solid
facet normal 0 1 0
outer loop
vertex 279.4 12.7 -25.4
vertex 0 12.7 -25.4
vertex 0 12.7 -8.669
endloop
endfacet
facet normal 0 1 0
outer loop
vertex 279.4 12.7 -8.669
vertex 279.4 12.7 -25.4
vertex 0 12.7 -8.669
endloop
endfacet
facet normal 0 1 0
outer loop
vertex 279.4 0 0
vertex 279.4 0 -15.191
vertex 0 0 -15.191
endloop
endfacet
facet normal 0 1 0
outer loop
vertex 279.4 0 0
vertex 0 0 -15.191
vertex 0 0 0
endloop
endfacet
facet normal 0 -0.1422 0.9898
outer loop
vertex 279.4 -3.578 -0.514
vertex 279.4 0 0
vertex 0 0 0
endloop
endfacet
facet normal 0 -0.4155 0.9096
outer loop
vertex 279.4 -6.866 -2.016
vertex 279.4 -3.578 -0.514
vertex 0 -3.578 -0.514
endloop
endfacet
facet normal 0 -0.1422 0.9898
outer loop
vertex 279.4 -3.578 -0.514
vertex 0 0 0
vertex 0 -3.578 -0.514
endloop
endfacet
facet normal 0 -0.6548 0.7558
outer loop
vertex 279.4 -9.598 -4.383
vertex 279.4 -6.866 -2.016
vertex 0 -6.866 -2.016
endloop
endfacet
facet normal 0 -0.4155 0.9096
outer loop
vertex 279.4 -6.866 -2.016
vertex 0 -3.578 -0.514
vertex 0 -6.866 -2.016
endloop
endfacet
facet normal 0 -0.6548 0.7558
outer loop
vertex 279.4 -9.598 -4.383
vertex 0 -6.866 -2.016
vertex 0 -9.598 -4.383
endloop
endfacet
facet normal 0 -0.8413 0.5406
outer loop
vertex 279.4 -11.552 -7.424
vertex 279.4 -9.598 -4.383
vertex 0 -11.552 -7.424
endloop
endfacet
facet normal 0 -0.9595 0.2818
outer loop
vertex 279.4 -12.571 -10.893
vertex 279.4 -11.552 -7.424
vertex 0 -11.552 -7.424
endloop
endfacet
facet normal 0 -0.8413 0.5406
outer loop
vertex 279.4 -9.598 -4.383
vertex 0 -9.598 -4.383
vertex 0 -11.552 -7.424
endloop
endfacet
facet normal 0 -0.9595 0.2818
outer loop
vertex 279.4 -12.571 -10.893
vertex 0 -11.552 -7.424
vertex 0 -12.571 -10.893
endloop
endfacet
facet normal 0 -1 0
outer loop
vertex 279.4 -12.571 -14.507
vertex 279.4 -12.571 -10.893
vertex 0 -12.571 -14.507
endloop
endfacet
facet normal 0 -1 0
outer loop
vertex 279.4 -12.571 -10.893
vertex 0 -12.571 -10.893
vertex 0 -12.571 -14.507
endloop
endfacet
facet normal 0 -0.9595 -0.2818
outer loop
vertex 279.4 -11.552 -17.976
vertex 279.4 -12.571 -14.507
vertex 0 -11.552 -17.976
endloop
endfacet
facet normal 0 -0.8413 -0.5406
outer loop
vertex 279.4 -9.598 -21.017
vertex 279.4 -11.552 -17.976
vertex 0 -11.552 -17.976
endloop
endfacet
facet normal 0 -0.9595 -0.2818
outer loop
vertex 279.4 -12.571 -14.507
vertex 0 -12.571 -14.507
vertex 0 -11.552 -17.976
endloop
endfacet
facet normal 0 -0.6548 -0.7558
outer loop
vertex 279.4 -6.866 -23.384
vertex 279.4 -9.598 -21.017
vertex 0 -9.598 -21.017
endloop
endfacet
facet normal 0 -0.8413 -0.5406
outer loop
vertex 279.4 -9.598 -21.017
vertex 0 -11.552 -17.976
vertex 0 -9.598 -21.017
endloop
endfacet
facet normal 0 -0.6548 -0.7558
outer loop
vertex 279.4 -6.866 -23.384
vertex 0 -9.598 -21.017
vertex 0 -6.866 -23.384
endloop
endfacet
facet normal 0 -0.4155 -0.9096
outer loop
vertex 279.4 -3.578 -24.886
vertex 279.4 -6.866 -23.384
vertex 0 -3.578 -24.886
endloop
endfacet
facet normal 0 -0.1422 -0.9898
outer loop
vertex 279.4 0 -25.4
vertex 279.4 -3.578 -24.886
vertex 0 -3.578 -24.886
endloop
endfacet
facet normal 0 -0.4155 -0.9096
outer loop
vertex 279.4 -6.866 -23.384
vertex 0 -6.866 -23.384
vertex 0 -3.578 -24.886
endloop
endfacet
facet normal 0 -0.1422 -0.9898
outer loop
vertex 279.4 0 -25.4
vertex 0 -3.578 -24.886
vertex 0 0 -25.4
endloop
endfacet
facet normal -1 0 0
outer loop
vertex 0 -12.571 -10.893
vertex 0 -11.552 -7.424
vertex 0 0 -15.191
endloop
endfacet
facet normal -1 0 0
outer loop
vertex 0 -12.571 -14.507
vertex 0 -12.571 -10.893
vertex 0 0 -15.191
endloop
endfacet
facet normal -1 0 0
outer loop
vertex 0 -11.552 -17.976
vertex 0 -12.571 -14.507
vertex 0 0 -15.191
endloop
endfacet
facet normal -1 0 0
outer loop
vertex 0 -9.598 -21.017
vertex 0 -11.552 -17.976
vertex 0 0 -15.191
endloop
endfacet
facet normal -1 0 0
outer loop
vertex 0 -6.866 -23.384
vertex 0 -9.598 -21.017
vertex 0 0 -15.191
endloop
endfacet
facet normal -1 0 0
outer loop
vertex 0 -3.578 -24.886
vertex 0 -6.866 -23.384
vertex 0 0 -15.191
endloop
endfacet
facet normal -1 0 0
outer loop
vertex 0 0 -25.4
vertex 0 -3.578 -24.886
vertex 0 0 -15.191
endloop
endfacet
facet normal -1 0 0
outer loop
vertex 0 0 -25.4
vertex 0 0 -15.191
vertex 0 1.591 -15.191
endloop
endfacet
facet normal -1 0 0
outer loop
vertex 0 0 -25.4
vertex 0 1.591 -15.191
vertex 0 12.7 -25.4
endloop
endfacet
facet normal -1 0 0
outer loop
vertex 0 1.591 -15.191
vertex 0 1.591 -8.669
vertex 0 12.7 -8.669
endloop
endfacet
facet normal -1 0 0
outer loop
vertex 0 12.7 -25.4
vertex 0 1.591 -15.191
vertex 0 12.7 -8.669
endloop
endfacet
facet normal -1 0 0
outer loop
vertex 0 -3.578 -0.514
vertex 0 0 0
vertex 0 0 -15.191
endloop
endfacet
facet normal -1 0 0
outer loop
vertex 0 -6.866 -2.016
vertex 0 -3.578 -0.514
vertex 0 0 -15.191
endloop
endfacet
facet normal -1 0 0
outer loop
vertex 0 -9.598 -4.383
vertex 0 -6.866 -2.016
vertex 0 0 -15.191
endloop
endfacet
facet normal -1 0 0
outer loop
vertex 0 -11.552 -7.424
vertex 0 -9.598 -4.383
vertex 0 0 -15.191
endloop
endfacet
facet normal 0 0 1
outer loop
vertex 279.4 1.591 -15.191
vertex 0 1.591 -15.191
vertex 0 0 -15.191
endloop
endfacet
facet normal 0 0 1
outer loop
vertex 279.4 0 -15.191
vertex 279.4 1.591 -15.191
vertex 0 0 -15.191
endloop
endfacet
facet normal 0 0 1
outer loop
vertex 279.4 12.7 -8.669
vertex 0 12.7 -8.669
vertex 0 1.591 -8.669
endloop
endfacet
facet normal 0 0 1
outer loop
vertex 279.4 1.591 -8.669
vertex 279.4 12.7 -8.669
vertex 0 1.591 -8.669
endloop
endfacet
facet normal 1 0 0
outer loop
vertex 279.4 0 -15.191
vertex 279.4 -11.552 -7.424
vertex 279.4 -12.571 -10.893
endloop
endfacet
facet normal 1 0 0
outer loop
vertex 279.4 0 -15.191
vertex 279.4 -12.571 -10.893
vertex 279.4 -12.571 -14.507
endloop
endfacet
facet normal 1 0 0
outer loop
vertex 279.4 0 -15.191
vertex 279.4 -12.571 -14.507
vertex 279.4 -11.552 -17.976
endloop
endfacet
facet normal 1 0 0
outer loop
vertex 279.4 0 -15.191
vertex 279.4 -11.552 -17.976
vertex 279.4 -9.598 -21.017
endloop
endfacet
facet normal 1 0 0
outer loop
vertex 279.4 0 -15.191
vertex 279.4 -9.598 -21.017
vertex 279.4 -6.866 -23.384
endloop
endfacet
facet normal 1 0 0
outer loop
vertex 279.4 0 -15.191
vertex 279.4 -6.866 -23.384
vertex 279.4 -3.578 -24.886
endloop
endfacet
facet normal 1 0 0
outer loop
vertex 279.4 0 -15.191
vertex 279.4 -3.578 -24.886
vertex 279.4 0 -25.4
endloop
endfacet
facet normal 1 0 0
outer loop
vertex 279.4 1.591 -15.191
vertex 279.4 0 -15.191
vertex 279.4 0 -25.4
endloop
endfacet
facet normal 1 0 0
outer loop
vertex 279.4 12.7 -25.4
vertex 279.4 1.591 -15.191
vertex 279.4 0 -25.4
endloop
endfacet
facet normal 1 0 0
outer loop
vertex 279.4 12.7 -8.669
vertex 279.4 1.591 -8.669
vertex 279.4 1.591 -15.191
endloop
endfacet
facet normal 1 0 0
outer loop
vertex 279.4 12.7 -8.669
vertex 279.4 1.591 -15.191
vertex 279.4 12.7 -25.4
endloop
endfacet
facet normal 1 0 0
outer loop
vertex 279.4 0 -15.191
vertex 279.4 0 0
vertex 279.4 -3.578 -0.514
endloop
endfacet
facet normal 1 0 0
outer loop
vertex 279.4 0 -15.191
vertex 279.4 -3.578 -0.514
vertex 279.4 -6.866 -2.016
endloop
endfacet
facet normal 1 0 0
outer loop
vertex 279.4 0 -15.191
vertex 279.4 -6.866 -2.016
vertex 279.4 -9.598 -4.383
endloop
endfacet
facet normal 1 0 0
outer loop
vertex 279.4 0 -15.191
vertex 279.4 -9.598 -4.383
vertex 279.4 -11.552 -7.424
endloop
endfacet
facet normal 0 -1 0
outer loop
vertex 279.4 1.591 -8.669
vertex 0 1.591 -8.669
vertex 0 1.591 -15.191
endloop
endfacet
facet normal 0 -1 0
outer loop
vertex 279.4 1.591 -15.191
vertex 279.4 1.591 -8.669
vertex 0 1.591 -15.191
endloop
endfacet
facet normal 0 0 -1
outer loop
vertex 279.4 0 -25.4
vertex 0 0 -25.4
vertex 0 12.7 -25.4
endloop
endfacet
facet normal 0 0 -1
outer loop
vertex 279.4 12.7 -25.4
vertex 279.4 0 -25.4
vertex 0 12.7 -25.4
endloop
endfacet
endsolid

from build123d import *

# Parameters (mm, degrees)
F1_DEPTH = 279.4


with BuildPart() as f1:
    # F0 (on Right) → F1 (new body)
    with BuildSketch(Plane.YZ):
        with BuildLine():
            Line((0, -15.190765), (0, 0))
            ThreePointArc((0, 0), (-12.7, -12.7), (0, -25.4))
            Line((0, -25.4), (0, -15.190765))
        make_face()
        Polygon((1.590656, -15.190765), (0, -15.190765), (0, -25.4), (12.7, -25.4), (12.7, -8.669076), (1.590656, -8.669076), align=None)
    extrude(amount=F1_DEPTH)


solid = f1.part
